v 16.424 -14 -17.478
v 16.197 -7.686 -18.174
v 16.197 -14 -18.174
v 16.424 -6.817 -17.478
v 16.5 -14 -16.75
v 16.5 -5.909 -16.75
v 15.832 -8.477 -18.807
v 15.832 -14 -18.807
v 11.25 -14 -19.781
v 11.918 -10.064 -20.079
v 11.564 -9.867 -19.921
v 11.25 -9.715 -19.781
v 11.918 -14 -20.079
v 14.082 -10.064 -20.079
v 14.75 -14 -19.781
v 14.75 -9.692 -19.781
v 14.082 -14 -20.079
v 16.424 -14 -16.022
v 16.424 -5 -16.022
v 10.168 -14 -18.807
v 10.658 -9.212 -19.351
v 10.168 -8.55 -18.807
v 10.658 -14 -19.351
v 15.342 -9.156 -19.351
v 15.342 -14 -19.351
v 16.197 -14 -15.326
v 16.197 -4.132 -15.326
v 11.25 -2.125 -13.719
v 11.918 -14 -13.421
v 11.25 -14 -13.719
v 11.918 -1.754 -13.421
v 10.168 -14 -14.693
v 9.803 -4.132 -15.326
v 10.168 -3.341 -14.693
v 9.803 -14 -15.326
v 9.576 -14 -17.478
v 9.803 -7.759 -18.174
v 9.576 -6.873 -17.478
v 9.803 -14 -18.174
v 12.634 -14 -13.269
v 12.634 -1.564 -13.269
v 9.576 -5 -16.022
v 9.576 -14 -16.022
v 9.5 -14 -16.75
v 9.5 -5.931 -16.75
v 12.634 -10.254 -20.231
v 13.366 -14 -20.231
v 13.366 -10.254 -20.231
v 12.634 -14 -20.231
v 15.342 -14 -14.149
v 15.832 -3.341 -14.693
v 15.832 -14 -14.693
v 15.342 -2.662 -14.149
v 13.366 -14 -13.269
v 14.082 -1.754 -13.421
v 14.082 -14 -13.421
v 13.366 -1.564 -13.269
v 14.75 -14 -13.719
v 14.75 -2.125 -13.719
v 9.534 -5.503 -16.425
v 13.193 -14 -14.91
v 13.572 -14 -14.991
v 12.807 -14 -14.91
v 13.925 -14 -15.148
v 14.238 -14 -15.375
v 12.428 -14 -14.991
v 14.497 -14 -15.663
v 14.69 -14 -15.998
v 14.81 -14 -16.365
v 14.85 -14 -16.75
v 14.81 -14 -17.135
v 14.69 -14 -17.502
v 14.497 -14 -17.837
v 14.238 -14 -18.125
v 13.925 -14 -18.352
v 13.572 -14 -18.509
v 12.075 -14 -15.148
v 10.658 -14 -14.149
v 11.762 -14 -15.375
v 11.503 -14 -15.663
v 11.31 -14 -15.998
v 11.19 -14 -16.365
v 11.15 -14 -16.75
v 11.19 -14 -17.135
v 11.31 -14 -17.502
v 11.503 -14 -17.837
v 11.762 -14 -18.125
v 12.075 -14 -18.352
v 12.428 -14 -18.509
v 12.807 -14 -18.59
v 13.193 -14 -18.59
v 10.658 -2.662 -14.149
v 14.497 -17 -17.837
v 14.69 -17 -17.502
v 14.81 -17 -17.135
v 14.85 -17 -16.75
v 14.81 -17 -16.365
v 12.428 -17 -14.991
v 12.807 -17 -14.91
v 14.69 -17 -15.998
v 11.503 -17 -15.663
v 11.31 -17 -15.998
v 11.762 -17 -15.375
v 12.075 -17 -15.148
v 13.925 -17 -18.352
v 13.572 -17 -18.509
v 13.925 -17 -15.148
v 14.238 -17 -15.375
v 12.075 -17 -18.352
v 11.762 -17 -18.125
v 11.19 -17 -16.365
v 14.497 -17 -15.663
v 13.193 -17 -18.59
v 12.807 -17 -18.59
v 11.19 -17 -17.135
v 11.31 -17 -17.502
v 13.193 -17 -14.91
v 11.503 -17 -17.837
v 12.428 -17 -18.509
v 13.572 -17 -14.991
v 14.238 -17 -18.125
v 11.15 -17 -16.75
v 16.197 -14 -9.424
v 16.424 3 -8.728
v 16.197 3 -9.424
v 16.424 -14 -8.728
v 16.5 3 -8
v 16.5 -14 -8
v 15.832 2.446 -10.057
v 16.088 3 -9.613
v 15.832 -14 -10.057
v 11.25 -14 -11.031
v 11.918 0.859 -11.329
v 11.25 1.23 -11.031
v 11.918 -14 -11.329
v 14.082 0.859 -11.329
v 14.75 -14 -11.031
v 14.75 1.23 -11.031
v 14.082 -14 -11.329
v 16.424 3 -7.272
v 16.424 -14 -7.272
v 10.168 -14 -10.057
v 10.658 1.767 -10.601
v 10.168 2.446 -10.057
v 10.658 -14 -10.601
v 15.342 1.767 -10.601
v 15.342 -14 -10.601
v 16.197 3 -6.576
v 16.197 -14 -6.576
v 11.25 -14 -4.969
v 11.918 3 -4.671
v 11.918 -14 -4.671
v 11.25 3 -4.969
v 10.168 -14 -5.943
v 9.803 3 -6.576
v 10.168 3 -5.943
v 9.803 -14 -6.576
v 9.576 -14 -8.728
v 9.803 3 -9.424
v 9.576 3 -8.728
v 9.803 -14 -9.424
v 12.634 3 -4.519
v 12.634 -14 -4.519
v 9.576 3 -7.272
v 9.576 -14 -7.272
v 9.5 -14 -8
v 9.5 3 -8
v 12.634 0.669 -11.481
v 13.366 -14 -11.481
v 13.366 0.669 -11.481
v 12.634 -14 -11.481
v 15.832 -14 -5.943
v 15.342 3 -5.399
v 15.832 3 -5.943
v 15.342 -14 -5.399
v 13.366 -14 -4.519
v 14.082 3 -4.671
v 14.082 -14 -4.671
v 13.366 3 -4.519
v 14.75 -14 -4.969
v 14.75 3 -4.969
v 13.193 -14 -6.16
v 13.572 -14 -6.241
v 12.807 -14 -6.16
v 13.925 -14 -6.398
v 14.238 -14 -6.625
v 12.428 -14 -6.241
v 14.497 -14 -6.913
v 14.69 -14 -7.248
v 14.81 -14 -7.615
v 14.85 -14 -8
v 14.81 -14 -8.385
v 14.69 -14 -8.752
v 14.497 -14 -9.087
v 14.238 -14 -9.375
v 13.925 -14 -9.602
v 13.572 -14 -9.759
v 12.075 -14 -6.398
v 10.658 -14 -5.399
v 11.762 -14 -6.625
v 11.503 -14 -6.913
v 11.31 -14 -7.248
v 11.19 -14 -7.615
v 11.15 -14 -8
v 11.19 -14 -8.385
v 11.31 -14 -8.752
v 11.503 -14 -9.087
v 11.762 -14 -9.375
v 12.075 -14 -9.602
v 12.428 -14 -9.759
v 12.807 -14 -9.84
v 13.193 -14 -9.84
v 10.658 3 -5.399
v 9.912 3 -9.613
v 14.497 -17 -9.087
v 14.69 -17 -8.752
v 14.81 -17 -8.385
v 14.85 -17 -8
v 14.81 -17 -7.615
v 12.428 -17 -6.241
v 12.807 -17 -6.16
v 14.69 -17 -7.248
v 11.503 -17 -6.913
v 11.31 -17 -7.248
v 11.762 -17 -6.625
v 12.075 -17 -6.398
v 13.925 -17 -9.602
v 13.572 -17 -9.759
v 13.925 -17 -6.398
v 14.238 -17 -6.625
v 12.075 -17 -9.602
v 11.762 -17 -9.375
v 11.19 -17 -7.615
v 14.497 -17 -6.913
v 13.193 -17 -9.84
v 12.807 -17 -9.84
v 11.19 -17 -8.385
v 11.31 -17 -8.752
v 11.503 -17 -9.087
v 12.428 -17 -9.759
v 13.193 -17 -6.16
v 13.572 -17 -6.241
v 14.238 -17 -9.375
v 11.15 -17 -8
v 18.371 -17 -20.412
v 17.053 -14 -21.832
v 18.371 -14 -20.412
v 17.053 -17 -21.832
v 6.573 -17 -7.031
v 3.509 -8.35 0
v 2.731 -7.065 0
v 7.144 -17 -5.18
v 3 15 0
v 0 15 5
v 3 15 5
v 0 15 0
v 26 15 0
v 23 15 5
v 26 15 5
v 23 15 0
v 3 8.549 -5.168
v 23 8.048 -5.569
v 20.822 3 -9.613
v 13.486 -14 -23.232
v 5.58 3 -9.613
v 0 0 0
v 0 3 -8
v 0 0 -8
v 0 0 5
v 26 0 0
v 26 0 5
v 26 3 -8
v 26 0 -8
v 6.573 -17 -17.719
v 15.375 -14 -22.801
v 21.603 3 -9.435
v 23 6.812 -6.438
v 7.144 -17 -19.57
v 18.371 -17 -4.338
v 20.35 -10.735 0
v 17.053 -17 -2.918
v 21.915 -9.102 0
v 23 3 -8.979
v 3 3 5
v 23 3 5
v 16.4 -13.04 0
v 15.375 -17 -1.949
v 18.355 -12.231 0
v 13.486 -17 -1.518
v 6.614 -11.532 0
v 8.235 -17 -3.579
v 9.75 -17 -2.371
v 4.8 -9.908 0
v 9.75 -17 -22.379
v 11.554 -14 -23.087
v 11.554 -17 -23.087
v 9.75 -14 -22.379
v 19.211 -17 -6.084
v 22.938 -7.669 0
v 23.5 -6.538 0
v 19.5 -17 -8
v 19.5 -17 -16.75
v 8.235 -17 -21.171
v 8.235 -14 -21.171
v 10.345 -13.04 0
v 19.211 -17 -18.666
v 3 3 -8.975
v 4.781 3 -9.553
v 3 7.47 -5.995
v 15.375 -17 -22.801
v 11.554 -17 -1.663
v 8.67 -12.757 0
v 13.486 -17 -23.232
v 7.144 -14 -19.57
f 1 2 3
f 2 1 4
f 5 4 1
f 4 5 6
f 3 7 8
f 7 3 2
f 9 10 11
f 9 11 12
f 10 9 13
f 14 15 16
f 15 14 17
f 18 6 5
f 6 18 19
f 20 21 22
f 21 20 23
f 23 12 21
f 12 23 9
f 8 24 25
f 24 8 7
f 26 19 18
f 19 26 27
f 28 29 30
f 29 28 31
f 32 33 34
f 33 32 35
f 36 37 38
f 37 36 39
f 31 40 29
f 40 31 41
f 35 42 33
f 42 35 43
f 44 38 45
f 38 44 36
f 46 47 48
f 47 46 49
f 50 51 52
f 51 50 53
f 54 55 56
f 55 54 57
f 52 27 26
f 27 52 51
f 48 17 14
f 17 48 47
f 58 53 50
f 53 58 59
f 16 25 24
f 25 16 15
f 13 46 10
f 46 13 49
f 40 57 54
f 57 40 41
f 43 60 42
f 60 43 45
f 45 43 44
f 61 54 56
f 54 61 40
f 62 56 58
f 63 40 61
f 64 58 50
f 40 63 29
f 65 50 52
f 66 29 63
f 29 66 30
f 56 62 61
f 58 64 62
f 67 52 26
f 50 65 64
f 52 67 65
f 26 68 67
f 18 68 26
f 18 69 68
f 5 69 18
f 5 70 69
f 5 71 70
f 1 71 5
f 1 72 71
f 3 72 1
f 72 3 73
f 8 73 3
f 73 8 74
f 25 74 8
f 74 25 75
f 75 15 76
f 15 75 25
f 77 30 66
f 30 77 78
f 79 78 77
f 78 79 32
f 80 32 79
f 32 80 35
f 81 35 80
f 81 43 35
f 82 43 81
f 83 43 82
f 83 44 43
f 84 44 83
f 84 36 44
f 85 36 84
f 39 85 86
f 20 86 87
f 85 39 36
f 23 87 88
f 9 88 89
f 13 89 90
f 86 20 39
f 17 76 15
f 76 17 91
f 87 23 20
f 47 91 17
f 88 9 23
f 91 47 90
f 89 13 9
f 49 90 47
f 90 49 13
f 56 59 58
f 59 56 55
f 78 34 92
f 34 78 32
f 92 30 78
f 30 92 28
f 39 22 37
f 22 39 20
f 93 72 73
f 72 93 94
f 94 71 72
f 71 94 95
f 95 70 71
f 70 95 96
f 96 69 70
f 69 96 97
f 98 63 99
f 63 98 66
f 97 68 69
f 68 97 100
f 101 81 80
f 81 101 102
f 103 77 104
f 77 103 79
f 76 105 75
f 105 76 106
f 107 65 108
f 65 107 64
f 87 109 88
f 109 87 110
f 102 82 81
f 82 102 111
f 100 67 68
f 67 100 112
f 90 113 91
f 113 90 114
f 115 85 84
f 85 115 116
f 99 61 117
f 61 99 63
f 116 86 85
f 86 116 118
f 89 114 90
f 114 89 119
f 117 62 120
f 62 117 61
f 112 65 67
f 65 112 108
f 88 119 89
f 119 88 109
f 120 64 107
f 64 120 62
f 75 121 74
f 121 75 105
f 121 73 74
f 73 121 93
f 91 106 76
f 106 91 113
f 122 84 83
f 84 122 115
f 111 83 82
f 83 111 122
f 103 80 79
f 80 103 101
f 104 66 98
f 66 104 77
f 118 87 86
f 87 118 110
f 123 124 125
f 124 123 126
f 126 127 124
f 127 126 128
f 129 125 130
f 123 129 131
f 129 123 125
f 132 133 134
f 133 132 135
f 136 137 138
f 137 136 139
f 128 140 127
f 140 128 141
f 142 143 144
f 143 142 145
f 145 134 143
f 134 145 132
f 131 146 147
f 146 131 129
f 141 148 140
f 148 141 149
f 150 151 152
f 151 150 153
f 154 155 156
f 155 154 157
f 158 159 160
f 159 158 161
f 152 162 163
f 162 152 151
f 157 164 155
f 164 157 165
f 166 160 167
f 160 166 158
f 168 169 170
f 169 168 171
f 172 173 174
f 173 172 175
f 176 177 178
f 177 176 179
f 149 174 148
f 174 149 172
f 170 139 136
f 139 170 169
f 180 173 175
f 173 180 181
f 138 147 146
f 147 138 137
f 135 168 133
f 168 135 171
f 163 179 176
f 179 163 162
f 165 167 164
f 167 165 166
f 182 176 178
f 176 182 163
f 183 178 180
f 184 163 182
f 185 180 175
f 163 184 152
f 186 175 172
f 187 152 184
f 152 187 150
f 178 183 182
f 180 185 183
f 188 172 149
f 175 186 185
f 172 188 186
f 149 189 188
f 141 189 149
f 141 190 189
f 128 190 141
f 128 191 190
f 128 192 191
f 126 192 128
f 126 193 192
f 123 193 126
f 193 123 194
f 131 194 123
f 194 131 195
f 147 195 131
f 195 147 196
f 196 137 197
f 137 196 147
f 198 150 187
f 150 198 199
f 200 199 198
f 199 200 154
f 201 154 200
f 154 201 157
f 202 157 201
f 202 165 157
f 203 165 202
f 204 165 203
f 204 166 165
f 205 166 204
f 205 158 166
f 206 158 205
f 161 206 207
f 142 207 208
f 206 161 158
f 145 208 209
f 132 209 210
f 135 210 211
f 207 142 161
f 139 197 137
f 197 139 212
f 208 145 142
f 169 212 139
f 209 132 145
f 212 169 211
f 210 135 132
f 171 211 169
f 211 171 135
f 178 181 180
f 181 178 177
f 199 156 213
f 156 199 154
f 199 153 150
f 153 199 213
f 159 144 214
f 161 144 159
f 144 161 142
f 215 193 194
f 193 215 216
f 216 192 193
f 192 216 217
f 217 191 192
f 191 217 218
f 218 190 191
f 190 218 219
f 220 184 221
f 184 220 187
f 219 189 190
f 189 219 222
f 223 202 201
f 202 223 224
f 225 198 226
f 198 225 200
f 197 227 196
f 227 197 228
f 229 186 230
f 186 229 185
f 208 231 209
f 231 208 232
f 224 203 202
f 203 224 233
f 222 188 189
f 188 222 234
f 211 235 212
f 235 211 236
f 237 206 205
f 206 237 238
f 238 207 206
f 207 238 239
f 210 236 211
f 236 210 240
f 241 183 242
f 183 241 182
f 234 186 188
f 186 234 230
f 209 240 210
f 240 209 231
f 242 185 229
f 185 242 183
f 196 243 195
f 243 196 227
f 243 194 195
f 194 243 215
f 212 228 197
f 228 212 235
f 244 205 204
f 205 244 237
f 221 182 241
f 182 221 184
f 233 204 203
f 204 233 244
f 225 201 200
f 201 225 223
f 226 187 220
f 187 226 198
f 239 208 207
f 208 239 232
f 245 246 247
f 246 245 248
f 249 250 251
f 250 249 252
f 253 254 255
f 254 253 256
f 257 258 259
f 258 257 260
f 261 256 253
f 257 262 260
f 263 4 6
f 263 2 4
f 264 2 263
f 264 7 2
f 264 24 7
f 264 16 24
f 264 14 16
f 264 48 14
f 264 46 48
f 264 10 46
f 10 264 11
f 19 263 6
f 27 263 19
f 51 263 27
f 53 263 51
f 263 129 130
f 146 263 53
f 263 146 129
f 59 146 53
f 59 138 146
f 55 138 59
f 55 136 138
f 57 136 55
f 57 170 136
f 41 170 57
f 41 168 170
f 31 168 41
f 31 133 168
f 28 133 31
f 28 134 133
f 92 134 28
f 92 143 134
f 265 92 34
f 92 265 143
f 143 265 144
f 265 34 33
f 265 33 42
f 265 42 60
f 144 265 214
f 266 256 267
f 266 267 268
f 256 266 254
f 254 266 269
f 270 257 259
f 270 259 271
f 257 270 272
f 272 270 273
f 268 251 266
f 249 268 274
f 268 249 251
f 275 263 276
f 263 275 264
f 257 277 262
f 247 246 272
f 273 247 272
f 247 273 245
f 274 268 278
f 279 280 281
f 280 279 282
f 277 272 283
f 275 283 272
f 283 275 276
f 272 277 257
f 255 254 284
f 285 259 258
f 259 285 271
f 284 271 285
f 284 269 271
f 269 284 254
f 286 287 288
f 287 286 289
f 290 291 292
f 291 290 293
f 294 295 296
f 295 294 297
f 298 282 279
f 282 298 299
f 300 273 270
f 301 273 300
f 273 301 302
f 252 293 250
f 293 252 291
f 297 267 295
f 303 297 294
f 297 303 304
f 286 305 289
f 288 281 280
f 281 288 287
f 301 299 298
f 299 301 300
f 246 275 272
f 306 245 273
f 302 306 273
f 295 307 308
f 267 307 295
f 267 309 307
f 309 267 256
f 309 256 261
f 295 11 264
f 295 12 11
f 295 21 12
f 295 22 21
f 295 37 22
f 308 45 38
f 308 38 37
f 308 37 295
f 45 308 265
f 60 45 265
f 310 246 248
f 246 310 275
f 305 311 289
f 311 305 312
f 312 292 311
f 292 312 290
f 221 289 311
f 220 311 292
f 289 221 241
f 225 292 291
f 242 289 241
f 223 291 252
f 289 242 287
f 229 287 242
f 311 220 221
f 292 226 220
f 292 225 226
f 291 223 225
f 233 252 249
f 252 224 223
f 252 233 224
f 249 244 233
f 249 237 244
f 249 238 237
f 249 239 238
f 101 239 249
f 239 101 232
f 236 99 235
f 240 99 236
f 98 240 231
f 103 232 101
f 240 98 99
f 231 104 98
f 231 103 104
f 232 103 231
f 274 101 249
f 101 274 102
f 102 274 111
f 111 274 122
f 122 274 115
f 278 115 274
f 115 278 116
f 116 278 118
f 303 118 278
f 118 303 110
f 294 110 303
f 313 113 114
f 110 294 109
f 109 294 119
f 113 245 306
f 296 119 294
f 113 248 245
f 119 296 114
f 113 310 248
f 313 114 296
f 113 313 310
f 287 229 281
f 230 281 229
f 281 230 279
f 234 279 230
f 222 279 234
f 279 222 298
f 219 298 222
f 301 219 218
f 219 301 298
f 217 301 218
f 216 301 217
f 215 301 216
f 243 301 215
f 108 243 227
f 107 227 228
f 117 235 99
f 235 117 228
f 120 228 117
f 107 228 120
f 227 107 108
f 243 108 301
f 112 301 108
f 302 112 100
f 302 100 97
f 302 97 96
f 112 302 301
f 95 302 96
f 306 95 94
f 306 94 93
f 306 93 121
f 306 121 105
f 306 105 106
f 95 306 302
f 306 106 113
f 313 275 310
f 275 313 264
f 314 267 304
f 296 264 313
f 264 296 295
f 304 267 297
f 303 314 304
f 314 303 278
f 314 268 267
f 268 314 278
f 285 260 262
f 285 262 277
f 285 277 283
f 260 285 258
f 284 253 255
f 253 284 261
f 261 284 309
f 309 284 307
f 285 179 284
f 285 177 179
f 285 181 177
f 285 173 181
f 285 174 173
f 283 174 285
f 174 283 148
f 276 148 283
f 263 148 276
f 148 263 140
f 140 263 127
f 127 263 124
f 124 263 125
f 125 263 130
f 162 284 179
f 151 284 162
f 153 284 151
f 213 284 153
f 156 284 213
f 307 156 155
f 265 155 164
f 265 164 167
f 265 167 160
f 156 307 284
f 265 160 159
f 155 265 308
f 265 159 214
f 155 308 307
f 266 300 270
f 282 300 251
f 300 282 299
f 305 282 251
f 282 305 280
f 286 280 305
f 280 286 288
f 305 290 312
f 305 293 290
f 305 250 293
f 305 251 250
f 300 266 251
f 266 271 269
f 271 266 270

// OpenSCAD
size = [20,12,2];
th = 3;
screw_dst = 17.5/2;
screw_r = 3.5;
mount_th = 3;

mount_offset = [17,8];

total_w = th*2+size[0];

bolt_th = 3;


module removeinner() {
    difference() {
        children();
        translate([1,1,-0.001]*th)
        translate([0,0,-150]) 
        cube(size+[0,th+.1,300]);   
   
        // negative y axis
        translate([0,-100,0])
        cube([100,100,100]);
        
        // screws and bolts
        translate([total_w/2, -mount_offset[0]+bolt_th, -mount_offset[1]])
        rotate([-90,0,0]) {
            cylinder(r=3.5, h=100, $fn=30);
            cylinder(r=3.7/2, h=100, $fn=30, center=true);
            
            translate([0,screw_dst,0]) {
                cylinder(r=3.5, h=100, $fn=30);
               cylinder(r=3.7/2, h=100, $fn=30, center=true);
            }
        }
    }
}
module switch() {
        cube(size+[2,1,1]*th);
}

module mount() {
    translate([total_w/2,-mount_offset[0],-mount_offset[1]])
    rotate([-90,0,0])
    difference() {
        hull() {
            cylinder(r=screw_r+mount_th, h=mount_th);
            translate([0,screw_dst,0]) cylinder(r=screw_r+mount_th, h=mount_th);
        }

    }
}

removeinner() {
    hull() {
        switch();
        mount();
        translate([total_w-th,0,-mount_offset[1]]) cube(th);
        translate([0,0,-mount_offset[1]]) cube(th);
    }
}
